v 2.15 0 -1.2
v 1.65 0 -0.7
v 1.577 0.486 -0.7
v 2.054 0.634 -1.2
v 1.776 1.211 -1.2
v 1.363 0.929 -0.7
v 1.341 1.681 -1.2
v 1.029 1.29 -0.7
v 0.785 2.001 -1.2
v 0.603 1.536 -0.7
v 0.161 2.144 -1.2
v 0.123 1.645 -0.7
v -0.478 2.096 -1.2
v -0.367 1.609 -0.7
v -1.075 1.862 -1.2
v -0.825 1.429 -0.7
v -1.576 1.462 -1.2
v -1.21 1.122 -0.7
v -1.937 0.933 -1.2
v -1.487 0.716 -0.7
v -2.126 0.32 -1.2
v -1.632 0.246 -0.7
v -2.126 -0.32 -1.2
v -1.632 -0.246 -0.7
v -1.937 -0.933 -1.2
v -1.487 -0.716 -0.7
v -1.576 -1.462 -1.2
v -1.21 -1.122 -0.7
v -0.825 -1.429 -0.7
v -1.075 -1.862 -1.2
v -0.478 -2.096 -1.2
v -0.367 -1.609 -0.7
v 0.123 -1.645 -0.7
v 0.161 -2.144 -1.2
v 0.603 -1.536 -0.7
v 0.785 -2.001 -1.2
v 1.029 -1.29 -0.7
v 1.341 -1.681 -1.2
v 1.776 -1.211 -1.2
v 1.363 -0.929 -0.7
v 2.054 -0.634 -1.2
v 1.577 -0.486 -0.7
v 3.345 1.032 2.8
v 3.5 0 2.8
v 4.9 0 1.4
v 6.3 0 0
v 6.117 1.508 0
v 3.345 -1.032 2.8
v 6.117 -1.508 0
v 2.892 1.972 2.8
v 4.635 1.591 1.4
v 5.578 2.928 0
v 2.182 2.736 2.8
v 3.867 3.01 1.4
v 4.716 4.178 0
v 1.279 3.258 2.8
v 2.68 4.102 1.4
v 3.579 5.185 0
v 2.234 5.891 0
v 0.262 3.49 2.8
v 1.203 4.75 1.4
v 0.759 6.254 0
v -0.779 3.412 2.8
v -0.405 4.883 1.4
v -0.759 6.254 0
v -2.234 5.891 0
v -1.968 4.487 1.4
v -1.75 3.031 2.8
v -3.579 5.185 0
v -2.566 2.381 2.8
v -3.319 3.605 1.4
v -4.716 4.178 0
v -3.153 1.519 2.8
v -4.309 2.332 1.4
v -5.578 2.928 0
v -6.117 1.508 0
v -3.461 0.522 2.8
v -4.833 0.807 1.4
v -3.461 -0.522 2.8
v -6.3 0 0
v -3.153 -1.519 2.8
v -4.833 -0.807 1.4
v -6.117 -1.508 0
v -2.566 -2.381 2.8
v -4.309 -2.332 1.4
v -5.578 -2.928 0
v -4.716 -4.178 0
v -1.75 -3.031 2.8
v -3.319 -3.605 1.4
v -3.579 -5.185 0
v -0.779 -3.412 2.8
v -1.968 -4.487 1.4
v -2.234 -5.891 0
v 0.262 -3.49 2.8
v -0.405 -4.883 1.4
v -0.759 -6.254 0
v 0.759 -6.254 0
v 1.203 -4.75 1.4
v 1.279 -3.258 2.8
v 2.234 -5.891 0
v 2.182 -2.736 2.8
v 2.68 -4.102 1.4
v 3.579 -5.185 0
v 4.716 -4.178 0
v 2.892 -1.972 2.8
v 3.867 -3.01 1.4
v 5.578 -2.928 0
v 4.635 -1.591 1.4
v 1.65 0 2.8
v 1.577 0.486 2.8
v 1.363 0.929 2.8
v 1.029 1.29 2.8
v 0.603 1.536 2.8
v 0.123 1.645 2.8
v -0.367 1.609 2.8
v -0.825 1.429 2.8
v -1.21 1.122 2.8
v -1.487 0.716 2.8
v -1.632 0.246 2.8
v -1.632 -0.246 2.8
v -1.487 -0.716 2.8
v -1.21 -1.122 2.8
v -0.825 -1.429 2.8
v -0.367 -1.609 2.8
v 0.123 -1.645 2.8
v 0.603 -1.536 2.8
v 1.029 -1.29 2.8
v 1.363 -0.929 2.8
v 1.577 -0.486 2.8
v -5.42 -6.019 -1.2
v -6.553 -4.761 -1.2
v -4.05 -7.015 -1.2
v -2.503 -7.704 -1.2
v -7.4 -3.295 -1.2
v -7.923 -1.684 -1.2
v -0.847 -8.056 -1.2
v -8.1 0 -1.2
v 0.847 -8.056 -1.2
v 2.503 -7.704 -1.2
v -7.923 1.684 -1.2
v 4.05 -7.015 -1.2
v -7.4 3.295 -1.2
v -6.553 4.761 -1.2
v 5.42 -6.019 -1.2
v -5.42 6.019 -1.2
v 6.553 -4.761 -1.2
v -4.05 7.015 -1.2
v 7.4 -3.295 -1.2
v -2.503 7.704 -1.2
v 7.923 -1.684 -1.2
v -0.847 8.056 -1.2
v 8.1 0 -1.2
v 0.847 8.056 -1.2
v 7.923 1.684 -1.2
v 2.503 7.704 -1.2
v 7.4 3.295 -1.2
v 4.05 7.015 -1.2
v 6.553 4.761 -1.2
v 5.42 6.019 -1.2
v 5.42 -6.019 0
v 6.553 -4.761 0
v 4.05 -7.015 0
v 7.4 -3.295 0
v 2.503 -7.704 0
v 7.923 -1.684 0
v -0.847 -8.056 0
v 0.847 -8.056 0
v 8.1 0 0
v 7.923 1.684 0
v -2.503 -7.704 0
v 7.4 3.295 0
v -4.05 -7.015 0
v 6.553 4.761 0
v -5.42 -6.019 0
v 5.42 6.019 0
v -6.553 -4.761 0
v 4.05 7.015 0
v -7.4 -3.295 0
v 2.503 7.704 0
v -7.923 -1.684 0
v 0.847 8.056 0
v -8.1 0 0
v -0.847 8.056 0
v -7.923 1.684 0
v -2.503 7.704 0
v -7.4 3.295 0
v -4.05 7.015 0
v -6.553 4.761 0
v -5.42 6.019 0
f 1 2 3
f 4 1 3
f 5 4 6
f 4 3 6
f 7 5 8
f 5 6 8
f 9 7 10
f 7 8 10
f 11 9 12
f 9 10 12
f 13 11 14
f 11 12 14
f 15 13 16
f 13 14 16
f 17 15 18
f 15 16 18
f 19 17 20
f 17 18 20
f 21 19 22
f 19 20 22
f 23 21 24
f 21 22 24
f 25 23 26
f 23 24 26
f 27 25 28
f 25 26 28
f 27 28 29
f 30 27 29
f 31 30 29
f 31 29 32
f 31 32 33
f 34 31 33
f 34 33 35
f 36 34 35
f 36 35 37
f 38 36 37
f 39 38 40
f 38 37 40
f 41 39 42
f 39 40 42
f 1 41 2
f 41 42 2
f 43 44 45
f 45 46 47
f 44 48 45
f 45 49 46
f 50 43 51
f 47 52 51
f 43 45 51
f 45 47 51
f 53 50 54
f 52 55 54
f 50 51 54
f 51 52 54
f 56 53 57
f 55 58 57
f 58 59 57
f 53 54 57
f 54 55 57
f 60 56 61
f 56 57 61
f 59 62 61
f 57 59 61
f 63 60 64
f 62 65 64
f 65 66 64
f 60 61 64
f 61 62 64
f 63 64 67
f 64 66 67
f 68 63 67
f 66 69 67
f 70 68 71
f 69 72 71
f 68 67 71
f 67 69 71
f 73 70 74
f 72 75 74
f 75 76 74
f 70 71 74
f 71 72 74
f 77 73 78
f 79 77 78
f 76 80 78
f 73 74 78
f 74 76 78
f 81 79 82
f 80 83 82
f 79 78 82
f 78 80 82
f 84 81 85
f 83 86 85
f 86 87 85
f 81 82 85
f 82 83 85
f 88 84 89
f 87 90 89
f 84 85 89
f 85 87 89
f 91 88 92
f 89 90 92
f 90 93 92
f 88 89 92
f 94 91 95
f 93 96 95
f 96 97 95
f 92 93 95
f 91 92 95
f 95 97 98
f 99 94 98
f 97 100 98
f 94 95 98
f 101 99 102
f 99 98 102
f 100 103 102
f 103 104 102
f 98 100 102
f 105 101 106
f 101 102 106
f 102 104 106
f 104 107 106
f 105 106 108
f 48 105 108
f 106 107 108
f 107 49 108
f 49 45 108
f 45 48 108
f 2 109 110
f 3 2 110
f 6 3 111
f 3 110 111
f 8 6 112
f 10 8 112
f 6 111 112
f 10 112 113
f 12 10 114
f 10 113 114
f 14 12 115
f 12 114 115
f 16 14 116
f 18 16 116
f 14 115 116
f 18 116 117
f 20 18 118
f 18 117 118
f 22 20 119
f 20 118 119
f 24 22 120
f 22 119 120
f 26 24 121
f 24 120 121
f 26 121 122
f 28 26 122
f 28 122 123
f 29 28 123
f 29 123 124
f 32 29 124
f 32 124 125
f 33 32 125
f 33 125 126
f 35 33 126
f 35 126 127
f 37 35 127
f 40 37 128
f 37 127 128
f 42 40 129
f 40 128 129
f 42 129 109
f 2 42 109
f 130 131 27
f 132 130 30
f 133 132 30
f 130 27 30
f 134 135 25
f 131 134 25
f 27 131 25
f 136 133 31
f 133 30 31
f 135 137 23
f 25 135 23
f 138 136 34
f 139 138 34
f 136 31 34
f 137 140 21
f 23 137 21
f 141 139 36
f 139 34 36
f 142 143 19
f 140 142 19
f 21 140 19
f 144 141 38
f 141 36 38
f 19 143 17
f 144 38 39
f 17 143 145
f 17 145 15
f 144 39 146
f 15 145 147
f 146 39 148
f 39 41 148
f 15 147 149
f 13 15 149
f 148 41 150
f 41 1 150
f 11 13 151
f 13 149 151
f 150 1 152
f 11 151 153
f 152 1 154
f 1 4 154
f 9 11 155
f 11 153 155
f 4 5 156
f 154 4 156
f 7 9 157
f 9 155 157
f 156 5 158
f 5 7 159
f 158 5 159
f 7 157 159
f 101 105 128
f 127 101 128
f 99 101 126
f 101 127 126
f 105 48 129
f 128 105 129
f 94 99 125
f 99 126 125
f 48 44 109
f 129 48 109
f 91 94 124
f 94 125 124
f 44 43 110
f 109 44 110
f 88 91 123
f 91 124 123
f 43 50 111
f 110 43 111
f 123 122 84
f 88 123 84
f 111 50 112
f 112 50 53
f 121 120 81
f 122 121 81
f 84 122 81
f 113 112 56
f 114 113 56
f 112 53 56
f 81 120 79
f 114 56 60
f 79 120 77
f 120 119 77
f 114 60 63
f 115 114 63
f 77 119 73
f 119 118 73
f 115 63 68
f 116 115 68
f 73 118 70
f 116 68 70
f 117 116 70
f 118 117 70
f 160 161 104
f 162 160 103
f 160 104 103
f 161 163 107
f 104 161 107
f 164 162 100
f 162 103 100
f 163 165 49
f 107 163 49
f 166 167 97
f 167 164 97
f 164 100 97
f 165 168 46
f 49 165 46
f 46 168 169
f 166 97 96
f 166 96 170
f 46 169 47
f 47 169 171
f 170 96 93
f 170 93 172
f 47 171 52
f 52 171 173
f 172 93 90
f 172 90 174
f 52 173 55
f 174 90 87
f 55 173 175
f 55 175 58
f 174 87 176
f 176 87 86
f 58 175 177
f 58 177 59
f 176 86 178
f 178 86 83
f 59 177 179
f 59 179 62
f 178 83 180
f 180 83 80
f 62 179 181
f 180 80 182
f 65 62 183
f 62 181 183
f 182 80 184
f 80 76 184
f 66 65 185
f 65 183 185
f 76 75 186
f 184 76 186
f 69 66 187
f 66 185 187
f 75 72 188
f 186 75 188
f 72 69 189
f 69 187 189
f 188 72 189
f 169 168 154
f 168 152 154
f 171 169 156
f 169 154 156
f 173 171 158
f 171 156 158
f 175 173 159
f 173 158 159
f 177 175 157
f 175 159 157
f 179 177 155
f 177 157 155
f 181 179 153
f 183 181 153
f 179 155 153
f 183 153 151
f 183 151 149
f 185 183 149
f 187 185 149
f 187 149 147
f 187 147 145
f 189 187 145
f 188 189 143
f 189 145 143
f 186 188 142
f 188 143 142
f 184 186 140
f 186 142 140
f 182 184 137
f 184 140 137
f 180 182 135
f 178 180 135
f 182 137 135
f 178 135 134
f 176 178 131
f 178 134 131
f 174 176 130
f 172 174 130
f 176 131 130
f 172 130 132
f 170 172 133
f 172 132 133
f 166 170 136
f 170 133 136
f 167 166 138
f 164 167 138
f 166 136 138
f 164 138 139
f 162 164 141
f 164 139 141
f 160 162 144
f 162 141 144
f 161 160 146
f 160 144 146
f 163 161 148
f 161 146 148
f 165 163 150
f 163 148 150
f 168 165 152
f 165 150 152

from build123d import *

# Parameters (mm, degrees)
CHAMFER1_SIZE = 0.5


with BuildPart() as part:
    # Sketch3 → Revolve1 (revolve)
    with BuildSketch(Plane(origin=(0, 0, 0), x_dir=(1, 0, 0), z_dir=(0, 1, 0))):
        Polygon((6.3, 0), (8.1, 0), (8.1, 1.2), (1.65, 1.2), (1.65, 0), (1.65, -2.8), (3.5, -2.8), align=None)
    revolve(axis=Axis((0, 0, -35.580076817), (0, 0, 1)))

    # Chamfer1
    chamfer1_edges = [part.edges().sort_by_distance(p)[0] for p in [
        (-1.65, 0, -1.2),
    ]]
    chamfer(chamfer1_edges, length=CHAMFER1_SIZE)


solid = part.part
